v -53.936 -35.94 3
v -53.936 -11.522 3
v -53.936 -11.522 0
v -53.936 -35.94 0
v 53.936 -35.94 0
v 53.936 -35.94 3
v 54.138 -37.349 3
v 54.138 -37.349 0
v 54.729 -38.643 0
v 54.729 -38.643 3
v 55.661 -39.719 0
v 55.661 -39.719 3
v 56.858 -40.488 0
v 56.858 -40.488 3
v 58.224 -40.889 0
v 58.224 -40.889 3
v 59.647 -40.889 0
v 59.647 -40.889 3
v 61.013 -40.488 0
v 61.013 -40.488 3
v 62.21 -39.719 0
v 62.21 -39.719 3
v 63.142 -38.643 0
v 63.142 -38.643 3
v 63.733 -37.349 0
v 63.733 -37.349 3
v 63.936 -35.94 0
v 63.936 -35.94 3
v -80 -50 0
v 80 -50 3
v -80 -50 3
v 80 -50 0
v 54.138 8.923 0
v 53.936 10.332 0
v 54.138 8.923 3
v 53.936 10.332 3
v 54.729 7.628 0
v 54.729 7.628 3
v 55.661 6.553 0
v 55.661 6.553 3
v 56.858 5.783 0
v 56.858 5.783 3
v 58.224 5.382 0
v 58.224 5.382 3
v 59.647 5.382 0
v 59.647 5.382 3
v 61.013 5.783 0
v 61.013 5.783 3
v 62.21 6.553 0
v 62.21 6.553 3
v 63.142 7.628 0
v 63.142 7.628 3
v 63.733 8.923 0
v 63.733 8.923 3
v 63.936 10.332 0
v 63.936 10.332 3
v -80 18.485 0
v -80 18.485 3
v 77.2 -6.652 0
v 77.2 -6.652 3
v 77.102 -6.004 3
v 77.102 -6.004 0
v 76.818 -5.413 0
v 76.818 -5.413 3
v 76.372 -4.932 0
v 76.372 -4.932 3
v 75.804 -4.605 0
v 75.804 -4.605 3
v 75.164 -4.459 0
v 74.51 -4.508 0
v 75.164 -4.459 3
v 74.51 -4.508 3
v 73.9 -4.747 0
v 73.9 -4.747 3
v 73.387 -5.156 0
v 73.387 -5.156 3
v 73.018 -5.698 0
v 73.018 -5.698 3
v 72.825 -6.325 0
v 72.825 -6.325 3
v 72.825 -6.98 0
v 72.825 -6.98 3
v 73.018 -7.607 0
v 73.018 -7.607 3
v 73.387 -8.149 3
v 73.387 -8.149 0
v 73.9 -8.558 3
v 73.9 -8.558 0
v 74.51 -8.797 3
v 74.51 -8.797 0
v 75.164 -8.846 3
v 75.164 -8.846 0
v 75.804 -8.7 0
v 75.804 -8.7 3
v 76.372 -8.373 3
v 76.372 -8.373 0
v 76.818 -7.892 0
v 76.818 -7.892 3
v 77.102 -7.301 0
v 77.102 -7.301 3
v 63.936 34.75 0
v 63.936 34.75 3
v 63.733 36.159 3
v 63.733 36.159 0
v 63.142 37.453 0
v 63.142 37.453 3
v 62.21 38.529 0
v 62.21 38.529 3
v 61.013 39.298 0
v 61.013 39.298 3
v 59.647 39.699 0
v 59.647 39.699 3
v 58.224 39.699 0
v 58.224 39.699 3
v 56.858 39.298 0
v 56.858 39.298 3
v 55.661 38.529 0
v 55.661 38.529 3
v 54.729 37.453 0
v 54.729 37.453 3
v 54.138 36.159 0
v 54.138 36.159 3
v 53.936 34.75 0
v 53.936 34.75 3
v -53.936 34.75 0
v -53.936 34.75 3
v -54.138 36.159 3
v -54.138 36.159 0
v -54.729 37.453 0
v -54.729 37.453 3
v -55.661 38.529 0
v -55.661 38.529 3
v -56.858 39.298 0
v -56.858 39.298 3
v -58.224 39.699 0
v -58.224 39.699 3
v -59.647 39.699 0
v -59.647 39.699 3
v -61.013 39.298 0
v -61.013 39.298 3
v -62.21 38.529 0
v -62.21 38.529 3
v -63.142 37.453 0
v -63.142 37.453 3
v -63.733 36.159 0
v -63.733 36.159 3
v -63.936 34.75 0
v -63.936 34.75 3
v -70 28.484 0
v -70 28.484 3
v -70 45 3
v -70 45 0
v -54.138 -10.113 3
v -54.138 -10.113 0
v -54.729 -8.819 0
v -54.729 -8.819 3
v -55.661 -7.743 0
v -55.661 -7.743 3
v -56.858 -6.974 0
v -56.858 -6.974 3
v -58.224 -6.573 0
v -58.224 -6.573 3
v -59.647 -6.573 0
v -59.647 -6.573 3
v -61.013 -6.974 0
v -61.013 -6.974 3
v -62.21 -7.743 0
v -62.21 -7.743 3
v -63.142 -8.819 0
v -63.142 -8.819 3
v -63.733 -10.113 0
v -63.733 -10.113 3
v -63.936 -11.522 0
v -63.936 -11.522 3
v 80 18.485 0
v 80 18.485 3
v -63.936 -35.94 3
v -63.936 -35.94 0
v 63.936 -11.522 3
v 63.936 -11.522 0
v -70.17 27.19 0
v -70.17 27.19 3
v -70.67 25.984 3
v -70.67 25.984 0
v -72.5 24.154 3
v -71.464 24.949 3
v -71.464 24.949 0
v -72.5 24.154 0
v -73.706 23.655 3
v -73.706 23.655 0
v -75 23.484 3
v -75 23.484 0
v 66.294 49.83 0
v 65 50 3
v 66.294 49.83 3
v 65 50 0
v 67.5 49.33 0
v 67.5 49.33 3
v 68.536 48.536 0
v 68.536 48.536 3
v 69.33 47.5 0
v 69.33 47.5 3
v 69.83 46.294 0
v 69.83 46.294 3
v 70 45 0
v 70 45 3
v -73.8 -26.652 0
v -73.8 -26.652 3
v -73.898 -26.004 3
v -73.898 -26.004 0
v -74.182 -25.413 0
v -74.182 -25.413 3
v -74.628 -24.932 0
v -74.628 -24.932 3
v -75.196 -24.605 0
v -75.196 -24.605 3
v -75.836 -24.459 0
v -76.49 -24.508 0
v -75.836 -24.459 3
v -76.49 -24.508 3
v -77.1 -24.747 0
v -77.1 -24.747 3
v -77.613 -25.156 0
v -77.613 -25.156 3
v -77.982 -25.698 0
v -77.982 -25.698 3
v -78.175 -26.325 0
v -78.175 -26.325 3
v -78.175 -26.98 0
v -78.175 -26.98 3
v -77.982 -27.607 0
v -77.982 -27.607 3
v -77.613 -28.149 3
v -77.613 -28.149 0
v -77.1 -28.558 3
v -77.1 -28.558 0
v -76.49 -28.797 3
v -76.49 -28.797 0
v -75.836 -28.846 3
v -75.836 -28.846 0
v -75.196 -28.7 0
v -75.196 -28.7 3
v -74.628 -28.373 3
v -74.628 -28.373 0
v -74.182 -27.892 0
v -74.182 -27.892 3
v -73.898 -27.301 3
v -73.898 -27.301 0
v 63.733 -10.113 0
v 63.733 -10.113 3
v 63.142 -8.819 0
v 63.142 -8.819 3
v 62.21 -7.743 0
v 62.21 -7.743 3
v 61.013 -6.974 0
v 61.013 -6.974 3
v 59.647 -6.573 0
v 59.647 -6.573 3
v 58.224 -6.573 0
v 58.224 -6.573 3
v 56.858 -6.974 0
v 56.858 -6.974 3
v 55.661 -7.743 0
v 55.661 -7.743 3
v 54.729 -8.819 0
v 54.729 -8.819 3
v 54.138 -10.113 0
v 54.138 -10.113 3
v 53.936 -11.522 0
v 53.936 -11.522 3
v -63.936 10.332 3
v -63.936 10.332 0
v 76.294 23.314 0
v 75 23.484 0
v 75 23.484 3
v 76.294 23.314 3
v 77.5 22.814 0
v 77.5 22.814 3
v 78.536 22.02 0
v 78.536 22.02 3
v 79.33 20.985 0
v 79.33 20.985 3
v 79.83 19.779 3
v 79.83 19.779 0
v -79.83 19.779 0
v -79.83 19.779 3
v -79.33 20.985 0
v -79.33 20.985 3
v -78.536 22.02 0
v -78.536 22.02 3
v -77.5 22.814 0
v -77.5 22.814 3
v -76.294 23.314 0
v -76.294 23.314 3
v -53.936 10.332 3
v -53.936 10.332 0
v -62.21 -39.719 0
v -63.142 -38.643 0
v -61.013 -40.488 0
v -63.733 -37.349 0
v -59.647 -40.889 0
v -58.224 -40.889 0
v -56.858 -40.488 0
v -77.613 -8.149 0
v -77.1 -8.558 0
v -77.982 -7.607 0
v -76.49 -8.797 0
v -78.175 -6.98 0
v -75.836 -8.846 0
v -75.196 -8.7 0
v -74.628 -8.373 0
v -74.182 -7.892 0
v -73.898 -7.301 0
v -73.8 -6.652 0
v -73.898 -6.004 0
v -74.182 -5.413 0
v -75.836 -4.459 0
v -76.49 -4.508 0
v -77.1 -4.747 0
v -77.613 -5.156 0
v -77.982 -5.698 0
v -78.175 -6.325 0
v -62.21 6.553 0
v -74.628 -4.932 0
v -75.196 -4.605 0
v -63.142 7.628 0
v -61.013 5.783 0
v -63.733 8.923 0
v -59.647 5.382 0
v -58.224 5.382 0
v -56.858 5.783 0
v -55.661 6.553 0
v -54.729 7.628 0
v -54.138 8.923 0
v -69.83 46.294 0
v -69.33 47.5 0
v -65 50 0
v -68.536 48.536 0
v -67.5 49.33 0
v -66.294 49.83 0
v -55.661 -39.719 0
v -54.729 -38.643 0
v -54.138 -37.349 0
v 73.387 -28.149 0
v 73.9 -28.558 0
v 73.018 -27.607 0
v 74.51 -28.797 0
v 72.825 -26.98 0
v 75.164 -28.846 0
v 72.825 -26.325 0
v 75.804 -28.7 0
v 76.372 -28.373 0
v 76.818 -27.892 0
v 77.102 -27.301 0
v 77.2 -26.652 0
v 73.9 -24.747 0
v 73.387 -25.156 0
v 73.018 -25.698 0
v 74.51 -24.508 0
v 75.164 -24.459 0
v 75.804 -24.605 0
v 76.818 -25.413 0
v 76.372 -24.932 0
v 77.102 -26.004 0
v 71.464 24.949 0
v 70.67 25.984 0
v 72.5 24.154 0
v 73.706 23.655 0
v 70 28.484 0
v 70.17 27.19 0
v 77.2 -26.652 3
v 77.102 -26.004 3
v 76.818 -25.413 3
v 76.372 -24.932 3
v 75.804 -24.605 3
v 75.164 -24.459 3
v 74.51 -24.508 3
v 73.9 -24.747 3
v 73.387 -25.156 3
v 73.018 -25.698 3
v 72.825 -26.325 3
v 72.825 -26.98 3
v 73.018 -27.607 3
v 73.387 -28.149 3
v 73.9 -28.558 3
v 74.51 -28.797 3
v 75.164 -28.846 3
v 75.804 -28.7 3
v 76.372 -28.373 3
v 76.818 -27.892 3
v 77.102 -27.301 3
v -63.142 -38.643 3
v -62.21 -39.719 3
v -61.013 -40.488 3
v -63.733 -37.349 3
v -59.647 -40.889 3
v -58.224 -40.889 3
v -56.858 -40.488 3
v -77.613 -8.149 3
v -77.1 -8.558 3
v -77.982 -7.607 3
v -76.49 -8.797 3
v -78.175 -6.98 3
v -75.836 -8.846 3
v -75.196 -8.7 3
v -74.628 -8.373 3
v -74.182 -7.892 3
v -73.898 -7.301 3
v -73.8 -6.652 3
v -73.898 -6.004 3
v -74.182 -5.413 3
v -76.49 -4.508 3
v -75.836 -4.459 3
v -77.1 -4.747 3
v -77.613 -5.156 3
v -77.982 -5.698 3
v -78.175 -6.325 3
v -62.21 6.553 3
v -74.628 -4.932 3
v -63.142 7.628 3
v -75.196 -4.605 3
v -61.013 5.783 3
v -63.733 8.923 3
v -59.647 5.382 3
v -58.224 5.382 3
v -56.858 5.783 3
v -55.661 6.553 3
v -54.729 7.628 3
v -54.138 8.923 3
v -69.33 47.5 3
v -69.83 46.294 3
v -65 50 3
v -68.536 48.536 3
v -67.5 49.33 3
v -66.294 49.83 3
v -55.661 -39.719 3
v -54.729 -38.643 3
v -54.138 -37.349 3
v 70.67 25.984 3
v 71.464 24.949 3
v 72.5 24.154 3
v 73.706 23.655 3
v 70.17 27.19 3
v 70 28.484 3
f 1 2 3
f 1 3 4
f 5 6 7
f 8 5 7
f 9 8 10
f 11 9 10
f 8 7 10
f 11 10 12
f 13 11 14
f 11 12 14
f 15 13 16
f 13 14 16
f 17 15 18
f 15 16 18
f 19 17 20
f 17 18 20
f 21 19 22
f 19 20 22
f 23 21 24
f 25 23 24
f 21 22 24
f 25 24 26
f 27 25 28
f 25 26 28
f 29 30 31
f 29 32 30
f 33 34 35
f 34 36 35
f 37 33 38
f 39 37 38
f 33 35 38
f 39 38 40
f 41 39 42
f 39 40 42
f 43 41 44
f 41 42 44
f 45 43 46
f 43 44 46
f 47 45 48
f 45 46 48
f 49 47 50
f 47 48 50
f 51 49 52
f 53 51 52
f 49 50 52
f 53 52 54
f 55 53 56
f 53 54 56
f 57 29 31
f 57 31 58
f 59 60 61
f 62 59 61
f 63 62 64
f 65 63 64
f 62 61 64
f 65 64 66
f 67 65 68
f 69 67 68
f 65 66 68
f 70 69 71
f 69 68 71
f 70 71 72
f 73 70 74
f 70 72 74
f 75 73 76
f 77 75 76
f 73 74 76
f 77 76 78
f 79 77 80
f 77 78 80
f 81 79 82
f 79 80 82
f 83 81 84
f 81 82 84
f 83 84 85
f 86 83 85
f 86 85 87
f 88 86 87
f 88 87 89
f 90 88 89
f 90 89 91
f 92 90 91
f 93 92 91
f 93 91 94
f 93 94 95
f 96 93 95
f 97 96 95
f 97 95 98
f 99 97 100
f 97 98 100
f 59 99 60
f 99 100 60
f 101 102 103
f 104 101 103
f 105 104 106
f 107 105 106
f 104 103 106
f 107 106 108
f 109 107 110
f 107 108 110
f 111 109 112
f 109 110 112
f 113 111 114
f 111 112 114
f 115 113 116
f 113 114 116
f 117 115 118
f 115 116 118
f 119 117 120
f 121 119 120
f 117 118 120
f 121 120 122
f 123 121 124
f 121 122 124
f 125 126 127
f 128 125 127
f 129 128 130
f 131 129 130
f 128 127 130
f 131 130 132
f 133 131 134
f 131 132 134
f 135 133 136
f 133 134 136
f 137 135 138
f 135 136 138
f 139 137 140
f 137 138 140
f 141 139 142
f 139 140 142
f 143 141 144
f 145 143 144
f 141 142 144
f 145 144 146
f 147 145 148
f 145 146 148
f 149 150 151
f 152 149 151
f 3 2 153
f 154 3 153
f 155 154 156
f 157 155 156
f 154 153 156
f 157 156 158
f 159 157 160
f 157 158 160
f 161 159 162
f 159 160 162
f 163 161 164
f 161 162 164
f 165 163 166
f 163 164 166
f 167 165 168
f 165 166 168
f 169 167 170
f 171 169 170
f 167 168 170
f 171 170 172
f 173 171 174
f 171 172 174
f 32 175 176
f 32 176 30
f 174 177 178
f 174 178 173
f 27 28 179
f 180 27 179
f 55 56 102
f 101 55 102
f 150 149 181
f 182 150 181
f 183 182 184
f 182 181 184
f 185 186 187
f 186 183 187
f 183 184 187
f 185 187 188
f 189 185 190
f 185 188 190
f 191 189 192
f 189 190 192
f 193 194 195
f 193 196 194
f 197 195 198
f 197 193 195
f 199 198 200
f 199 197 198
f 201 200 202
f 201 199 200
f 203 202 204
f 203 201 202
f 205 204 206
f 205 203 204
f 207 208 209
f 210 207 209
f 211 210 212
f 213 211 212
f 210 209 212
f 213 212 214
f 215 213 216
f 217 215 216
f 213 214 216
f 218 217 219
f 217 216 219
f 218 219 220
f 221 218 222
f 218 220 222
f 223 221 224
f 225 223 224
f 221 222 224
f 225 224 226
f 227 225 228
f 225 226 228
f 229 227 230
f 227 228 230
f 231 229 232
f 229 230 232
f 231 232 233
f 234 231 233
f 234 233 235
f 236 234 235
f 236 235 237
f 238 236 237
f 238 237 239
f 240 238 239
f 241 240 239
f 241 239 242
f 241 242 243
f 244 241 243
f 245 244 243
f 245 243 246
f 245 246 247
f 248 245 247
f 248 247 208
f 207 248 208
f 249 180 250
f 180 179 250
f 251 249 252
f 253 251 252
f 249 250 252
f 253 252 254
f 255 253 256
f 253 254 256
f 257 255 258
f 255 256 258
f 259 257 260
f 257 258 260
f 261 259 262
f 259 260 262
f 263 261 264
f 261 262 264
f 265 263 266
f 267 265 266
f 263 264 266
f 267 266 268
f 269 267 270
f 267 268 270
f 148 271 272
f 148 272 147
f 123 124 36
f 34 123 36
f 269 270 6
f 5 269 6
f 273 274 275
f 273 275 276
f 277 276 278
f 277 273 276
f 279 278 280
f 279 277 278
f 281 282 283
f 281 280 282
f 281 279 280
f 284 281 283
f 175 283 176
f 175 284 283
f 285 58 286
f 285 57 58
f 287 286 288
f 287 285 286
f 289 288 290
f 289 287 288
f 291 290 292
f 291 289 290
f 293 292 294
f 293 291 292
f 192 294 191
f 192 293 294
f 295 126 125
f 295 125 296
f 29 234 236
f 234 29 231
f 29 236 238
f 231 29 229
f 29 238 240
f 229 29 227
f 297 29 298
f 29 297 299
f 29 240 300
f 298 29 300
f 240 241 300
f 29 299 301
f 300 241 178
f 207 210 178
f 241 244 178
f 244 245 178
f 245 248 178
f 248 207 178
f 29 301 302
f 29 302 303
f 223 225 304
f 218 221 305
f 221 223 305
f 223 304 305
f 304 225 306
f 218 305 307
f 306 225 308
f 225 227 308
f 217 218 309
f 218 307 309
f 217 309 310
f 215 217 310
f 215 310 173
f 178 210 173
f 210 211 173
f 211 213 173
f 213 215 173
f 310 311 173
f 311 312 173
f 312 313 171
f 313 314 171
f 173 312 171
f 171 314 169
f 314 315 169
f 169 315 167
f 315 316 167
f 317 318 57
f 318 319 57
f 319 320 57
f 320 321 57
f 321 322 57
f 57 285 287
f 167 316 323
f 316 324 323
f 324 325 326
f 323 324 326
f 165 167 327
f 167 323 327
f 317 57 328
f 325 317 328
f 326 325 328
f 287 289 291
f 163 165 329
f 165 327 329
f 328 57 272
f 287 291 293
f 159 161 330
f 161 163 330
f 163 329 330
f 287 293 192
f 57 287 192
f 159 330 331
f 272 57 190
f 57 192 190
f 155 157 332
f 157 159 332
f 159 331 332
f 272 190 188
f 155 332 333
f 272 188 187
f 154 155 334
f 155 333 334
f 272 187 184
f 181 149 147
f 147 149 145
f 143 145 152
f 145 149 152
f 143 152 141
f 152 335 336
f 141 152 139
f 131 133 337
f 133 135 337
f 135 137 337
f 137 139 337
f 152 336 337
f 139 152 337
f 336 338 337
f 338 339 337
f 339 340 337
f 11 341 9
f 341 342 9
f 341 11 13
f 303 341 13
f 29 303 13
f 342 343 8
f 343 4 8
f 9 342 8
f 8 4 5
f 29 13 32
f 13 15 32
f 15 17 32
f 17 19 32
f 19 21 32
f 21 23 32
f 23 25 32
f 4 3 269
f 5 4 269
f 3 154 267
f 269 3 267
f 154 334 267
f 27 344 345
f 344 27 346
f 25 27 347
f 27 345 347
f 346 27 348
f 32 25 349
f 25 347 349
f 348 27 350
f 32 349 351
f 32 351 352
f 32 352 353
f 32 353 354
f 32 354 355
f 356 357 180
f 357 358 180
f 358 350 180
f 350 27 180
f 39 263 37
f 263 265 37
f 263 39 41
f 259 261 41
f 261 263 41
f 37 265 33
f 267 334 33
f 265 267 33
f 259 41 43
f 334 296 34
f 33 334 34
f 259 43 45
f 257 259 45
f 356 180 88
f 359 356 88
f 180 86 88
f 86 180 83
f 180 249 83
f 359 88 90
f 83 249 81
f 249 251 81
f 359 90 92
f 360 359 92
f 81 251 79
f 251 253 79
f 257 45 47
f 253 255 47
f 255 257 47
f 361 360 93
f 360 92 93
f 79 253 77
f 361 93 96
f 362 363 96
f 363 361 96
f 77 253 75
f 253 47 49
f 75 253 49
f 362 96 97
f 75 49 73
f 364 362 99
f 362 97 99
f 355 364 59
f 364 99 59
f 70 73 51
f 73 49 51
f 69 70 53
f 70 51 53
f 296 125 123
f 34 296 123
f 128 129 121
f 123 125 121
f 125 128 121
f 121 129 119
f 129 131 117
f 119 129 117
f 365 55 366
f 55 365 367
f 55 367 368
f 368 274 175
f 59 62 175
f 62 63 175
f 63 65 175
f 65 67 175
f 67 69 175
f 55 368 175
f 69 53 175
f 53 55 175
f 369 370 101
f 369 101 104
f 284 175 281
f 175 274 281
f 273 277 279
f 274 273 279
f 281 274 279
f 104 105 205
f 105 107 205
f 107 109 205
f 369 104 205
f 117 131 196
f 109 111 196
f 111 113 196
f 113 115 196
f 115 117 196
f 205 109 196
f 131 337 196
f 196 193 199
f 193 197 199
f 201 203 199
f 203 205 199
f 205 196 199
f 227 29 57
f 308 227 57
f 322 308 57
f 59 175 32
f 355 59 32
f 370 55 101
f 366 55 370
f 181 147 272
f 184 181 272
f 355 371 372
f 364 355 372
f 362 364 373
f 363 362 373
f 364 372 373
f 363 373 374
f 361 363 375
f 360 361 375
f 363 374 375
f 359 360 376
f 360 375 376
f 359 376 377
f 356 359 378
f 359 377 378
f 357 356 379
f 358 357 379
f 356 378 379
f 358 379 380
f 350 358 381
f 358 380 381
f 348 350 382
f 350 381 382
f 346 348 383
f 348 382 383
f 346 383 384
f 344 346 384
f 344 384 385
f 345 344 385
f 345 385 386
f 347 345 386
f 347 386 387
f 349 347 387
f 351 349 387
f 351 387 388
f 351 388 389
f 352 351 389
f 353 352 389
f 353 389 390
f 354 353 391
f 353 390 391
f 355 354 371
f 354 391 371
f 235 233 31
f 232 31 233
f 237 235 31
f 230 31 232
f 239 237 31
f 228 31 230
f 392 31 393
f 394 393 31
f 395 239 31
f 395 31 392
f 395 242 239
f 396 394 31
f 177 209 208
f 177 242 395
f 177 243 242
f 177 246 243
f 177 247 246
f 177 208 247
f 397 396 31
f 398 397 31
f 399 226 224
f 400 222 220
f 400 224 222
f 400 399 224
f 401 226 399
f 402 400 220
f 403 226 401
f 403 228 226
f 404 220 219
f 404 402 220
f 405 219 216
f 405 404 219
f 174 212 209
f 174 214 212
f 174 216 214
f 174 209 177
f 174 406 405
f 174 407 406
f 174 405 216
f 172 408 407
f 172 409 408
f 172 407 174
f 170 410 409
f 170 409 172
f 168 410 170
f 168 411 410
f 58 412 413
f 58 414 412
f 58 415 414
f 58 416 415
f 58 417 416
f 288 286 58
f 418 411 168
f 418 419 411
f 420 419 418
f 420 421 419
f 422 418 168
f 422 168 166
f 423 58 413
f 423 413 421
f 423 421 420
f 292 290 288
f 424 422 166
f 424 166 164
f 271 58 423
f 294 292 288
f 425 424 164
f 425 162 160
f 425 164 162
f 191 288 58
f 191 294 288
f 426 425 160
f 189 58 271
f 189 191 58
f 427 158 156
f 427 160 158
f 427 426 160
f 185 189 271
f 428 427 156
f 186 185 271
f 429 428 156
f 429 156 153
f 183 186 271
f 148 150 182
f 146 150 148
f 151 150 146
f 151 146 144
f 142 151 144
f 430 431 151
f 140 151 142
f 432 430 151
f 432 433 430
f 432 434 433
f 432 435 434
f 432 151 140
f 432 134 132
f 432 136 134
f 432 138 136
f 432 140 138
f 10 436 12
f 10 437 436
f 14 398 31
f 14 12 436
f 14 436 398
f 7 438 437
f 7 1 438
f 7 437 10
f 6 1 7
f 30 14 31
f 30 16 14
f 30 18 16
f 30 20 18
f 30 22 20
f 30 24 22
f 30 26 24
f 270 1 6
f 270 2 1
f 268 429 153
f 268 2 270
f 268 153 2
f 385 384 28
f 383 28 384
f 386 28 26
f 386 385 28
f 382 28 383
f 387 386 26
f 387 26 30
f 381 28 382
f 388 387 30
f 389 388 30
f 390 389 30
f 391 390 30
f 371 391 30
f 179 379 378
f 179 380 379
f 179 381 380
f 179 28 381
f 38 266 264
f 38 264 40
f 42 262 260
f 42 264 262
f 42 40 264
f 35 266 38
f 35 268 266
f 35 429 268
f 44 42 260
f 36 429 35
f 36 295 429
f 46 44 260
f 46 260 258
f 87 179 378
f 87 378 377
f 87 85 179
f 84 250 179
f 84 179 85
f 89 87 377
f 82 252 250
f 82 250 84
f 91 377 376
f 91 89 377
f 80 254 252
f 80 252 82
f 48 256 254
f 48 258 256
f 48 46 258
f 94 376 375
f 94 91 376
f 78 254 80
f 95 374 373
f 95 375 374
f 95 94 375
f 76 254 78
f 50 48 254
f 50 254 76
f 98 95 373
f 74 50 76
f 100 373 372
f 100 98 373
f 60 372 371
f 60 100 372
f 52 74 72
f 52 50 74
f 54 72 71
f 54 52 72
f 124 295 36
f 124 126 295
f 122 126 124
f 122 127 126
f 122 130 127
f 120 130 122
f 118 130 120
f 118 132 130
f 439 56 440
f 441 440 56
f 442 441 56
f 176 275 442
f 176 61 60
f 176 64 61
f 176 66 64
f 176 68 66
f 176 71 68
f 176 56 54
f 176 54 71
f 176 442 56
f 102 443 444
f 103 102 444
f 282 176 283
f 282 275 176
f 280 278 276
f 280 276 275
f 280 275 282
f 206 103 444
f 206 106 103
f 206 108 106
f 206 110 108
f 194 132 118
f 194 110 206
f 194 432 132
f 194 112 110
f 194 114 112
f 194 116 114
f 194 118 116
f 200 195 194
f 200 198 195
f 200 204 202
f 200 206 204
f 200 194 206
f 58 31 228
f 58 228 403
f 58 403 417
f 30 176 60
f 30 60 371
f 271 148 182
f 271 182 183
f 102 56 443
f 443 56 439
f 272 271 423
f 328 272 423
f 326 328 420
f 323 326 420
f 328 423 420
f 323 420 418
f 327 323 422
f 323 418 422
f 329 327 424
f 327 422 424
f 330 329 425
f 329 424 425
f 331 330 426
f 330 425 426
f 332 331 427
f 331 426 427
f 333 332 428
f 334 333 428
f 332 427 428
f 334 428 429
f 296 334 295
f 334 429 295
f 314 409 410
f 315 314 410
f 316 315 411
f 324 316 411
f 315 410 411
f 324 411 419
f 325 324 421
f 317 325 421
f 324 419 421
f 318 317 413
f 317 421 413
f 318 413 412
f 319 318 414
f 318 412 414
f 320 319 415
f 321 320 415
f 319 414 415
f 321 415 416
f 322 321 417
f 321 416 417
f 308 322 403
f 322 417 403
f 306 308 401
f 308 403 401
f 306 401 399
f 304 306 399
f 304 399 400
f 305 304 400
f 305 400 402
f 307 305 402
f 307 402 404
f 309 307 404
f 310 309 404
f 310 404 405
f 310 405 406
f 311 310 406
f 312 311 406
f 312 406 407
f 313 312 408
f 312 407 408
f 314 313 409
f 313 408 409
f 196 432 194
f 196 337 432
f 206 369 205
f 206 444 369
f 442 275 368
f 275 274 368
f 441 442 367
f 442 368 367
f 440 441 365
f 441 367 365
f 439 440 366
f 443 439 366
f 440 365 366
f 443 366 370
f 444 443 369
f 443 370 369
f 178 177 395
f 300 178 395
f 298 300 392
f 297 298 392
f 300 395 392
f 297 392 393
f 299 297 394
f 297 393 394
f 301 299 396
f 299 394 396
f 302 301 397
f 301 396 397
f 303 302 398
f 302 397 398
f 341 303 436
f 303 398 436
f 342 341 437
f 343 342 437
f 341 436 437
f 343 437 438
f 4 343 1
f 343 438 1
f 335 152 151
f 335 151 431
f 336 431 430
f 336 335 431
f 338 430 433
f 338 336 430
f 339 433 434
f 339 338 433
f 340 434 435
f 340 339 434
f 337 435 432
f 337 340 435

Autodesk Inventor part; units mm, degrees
ref_plane "YZ Plane" through (0, 0, 0) normal (1, 0, 0) x (0, 1, 0)
ref_plane "XZ Plane" through (0, 0, 0) normal (0, 1, 0) x (-1, 0, 0)
ref_plane "XY Plane" through (0, 0, 0) normal (0, 0, 1) x (1, 0, 0)
sketch "草图1" plane through (0, 0, 0) normal (0, 0, 1) x (1, 0, 0)
  line L0 (80, -50) -> (-80, -50)
  line L1 (-80, -50) -> (-80, 50)
  line L2 (-80, 50) -> (80, 50)
  line L3 (80, 50) -> (80, -50)
  line L4 (80, -50) -> (-80, 50) construction
  line L5 (-80, -50) -> (80, 50) construction
  point P0 (0, 0)
  dimension "d0" = 100
  dimension "d1" = 160
extrude "拉伸1" add sketch "草图1" along normal blind 3
sketch "草图2" plane through (0, 0, 3) normal (0, 0, 1) x (1, 0, 0)
  line L0 (-70, 23.4843) -> (-70, 54.6776)
  line L1 (70, 15.0319) -> (70, 54.3435) projected
  line L2 (-80, 50) -> (-80, -50) projected
  line L3 (-80, 23.4843) -> (80.034, 23.4843)
  line L4 (80, 50) -> (-80, 50) projected
  line L5 (-80, 50) -> (-80, -50) projected
  line L6 (-80, -50) -> (80, -50) projected
  line L7 (80, -50) -> (80, 50) projected
  point P0 (0, 0)
  point P1 (80, 23.4843)
  point P2 (70, 50)
  point P3 (70, 23.4843)
  point P4 (-70, 50)
  dimension "d6" = 10
  dimension "d7" = 10
extrude "拉伸2" cut sketch "草图2" against normal blind 10 contours L3 L2 L4 L0 | L1 L4 L7 L3
fillet "圆角1" radius 5 6 edges at (-80, 23.4843, 1.5) (-70, 23.4843, 1.5) (-70, 50, 1.5) (70, 50, 1.5) (70, 23.4843, 1.5) (80, 23.4843, 1.5)
sketch "草图7" plane through (0, 0, 3) normal (0, 0, 1) x (1, 0, 0)
  circle A0 centre (75, -6.6525) radius 1.2 projected
  circle A1 centre (75, -26.6525) radius 1.2 projected
  circle A2 centre (-76, -6.6525) radius 1.2 projected
  circle A3 centre (-76, -26.6525) radius 1.2 projected
  circle A4 centre (-76, -6.6525) radius 2.2
  circle A5 centre (-76, -26.6525) radius 2.2
  circle A6 centre (75, -6.6525) radius 2.2
  circle A7 centre (75, -26.6525) radius 2.2
  point P0 (0, 0)
  dimension "d78" = 1
  dimension "d79" = 1
  dimension "d80" = 1
  dimension "d81" = 1
extrude "拉伸5" cut sketch "草图7" against normal blind 10 contours A0 | A1 | A2 | A3 | A4 | A5 | A6 | A7
sketch "草图6" plane through (0, 0, 3) normal (0, 0, 1) x (1, 0, 0)
  circle A0 centre (-0.337, 1.4402) radius 29.6824
  line L0 (58.9355, -11.5218) -> (58.9355, -35.9401) construction
  line L1 (53.9355, -11.5218) -> (53.9355, -35.9401)
  line L2 (63.9355, -35.9401) -> (63.9355, -11.5218)
  arc A1 (63.9355, -11.5218) -> (53.9355, -11.5218) centre (58.9355, -11.5218) ccw
  arc A2 (53.9355, -35.9401) -> (63.9355, -35.9401) centre (58.9355, -35.9401) ccw
  line L3 (58.9355, 34.7499) -> (58.9355, 10.3316) construction
  line L4 (53.9355, 34.7499) -> (53.9355, 10.3316)
  line L5 (63.9355, 10.3316) -> (63.9355, 34.7499)
  arc A3 (63.9355, 34.7499) -> (53.9355, 34.7499) centre (58.9355, 34.7499) ccw
  arc A4 (53.9355, 10.3316) -> (63.9355, 10.3316) centre (58.9355, 10.3316) ccw
  line L6 (65, 50) -> (-65, 50) projected
  line L7 (0, 50) -> (0, -49.5861)
  line L8 (-58.9355, -11.5218) -> (-58.9355, -35.9401) construction
  line L9 (-53.9355, -11.5218) -> (-53.9355, -35.9401)
  line L10 (-63.9355, -35.9401) -> (-63.9355, -11.5218)
  arc A5 (-53.9355, -11.5218) -> (-63.9355, -11.5218) centre (-58.9355, -11.5218) ccw
  arc A6 (-63.9355, -35.9401) -> (-53.9355, -35.9401) centre (-58.9355, -35.9401) ccw
  line L11 (-58.9355, 34.7499) -> (-58.9355, 10.3316) construction
  line L12 (-53.9355, 34.7499) -> (-53.9355, 10.3316)
  line L13 (-63.9355, 10.3316) -> (-63.9355, 34.7499)
  arc A7 (-53.9355, 34.7499) -> (-63.9355, 34.7499) centre (-58.9355, 34.7499) ccw
  arc A8 (-63.9355, 10.3316) -> (-53.9355, 10.3316) centre (-58.9355, 10.3316) ccw
  point P0 (0, 0)
  point P1 (58.9355, -23.7309)
  point P2 (58.9355, 22.5408)
  point P3 (-58.9355, -23.7309)
  point P4 (-58.9355, 22.5408)
  dimension "d70" = 5
  dimension "d71" = 5
extrude "拉伸4" cut sketch "草图6" against normal blind 10 contours A1 L2 A2 L1 | A3 L5 A4 L4 | L9 A6 L10 A5 | L12 A8 L13 A7
sketch "草图5" plane through (0, 0, 3) normal (0, 0, 1) x (1, 0, 0)
  line L0 (-51.948, 44.2905) -> (50.6435, 44.2905) construction
  line L1 (50.6435, 44.2905) -> (50.6435, -58.301) construction
  line L2 (50.6435, -58.301) -> (-51.948, -58.301) construction
  line L3 (-51.948, -58.301) -> (-51.948, 44.2905) construction
  circle A0 centre (-0.337, 1.4402) radius 19.5793
  circle A1 centre (-0.337, 1.4402) radius 22.0126
  circle A2 centre (-0.1836, 17.5889) radius 1.0689
  circle A3 centre (14.0973, -7.3293) radius 1.2102
  circle A4 centre (-14.6768, -7.0871) radius 1.2453
  arc A5 (-1.5966, 22.3303) -> (-3.177, 23.2671) centre (-2.9305, 21.8816) ccw
  arc A6 (-1.5966, 22.3303) -> (1.2246, 22.333) centre (-0.1861, 22.4331) ccw
  arc A7 (2.2174, 23.304) -> (1.2246, 22.333) centre (2.87, 21.6437) ccw
  line L4 (-3.1076, 23.2777) -> (-2.7908, 20.865)
  line L5 (2.4336, 23.2777) -> (2.4336, 20.8224)
  arc A8 (-6.9604, 21.2925) -> (-8.7295, 21.7883) centre (-8.1327, 20.5138) ccw
  arc A9 (-6.9604, 21.2925) -> (-4.236, 22.0252) centre (-5.6246, 21.7569) ccw
  arc A10 (-3.5284, 23.2201) -> (-4.236, 22.0252) centre (-2.4683, 21.7854) ccw
  arc A11 (-11.8729, 18.9017) -> (-13.71, 18.9228) centre (-12.8037, 17.8462) ccw
  arc A12 (-11.8729, 18.9017) -> (-9.431, 20.3147) centre (-10.7028, 19.6961) ccw
  arc A13 (-9.0567, 21.652) -> (-9.431, 20.3147) centre (-7.6614, 20.5405) ccw
  arc A14 (-15.9992, 15.321) -> (-17.7792, 14.8659) centre (-16.6251, 14.0606) ccw
  arc A15 (-15.9992, 15.321) -> (-14.0062, 17.3179) centre (-15.0746, 16.3912) ccw
  arc A16 (-13.9908, 18.7065) -> (-14.0062, 17.3179) centre (-12.3554, 17.994) ccw
  arc A17 (-19.0582, 10.7944) -> (-20.6597, 9.8941) centre (-19.3365, 9.4149) ccw
  arc A18 (-19.0582, 10.7944) -> (-17.6499, 13.239) centre (-18.442, 12.0674) ccw
  arc A19 (-17.9944, 14.5843) -> (-17.6499, 13.239) centre (-16.2303, 14.3193) ccw
  arc A20 (-20.8413, 5.6302) -> (-22.1553, 4.3462) centre (-20.7531, 4.2257) ccw
  arc A21 (-20.8413, 5.6302) -> (-20.1137, 8.356) centre (-20.5756, 7.0193) ccw
  arc A22 (-20.7947, 9.5663) -> (-20.1137, 8.356) centre (-19.0221, 9.767) ccw
  arc A23 (-21.2271, 0.1806) -> (-22.164, -1.3998) centre (-20.7784, -1.1533) ccw
  arc A24 (-21.2271, 0.1806) -> (-21.2298, 3.0018) centre (-21.33, 1.5911) ccw
  arc A25 (-22.2009, 3.9946) -> (-21.2298, 3.0018) centre (-20.5406, 4.6472) ccw
  arc A26 (-20.1893, -5.1833) -> (-20.6852, -6.9523) centre (-19.4107, -6.3555) ccw
  arc A27 (-20.1893, -5.1833) -> (-20.9221, -2.4589) centre (-20.6537, -3.8474) ccw
  arc A28 (-22.117, -1.7512) -> (-20.9221, -2.4589) centre (-20.6822, -0.6911) ccw
  arc A29 (-17.7986, -10.0958) -> (-17.8197, -11.9328) centre (-16.7431, -11.0265) ccw
  arc A30 (-17.7986, -10.0958) -> (-19.2115, -7.6538) centre (-18.5929, -8.9256) ccw
  arc A31 (-20.5489, -7.2796) -> (-19.2115, -7.6538) centre (-19.4374, -5.8843) ccw
  arc A32 (-14.2179, -14.2221) -> (-13.7628, -16.002) centre (-12.9574, -14.8479) ccw
  arc A33 (-14.2179, -14.2221) -> (-16.2147, -12.229) centre (-15.288, -13.2974) ccw
  arc A34 (-17.6033, -12.2137) -> (-16.2147, -12.229) centre (-16.8908, -10.5782) ccw
  arc A35 (-9.6912, -17.281) -> (-8.791, -18.8825) centre (-8.3117, -17.5594) ccw
  arc A36 (-9.6912, -17.281) -> (-12.1358, -15.8727) centre (-10.9642, -16.6648) ccw
  arc A37 (-13.4811, -16.2173) -> (-12.1358, -15.8727) centre (-13.2162, -14.4531) ccw
  arc A38 (-4.5271, -19.0642) -> (-3.243, -20.3781) centre (-3.1226, -18.976) ccw
  arc A39 (-4.5271, -19.0642) -> (-7.2529, -18.3366) centre (-5.9162, -18.7985) ccw
  arc A40 (-8.4632, -19.0176) -> (-7.2529, -18.3366) centre (-8.6639, -17.245) ccw
  arc A41 (0.9226, -19.45) -> (2.503, -20.3868) centre (2.2564, -19.0013) ccw
  arc A42 (0.9226, -19.45) -> (-1.8987, -19.4527) centre (-0.4879, -19.5528) ccw
  arc A43 (-2.8914, -20.4237) -> (-1.8987, -19.4527) centre (-3.5441, -18.7634) ccw
  arc A44 (6.2864, -18.4122) -> (8.0554, -18.908) centre (7.4587, -17.6335) ccw
  arc A45 (6.2864, -18.4122) -> (3.562, -19.1449) centre (4.9506, -18.8766) ccw
  arc A46 (2.8544, -20.3398) -> (3.562, -19.1449) centre (1.7943, -18.9051) ccw
  arc A47 (11.1989, -16.0214) -> (13.036, -16.0425) centre (12.1297, -14.9659) ccw
  arc A48 (11.1989, -16.0214) -> (8.757, -17.4344) centre (10.0288, -16.8158) ccw
  arc A49 (8.3827, -18.7717) -> (8.757, -17.4344) centre (6.9874, -17.6602) ccw
  arc A50 (15.3252, -12.4407) -> (17.1051, -11.9856) centre (15.9511, -11.1803) ccw
  arc A51 (15.3252, -12.4407) -> (13.3322, -14.4376) centre (14.4005, -13.5109) ccw
  arc A52 (13.3168, -15.8262) -> (13.3322, -14.4376) centre (11.6814, -15.1137) ccw
  arc A53 (18.3842, -7.9141) -> (19.9857, -7.0138) centre (18.6625, -6.5346) ccw
  arc A54 (18.3842, -7.9141) -> (16.9759, -10.3587) centre (17.768, -9.1871) ccw
  arc A55 (17.3204, -11.704) -> (16.9759, -10.3587) centre (15.5563, -11.439) ccw
  arc A56 (20.1673, -2.7499) -> (21.4812, -1.4659) centre (20.0791, -1.3454) ccw
  arc A57 (20.1673, -2.7499) -> (19.4397, -5.4757) centre (19.9016, -4.139) ccw
  arc A58 (20.1207, -6.686) -> (19.4397, -5.4757) centre (18.3481, -6.8867) ccw
  arc A59 (20.5531, 2.6997) -> (21.4899, 4.2801) centre (20.1044, 4.0336) ccw
  arc A60 (20.5531, 2.6997) -> (20.5558, -0.1215) centre (20.656, 1.2892) ccw
  arc A61 (21.5268, -1.1143) -> (20.5558, -0.1215) centre (19.8666, -1.7669) ccw
  arc A62 (19.5153, 8.0636) -> (20.0111, 9.8326) centre (18.7366, 9.2358) ccw
  arc A63 (19.5153, 8.0636) -> (20.2481, 5.3392) centre (19.9797, 6.7277) ccw
  arc A64 (21.443, 4.6315) -> (20.2481, 5.3392) centre (20.0082, 3.5714) ccw
  arc A65 (17.1246, 12.9761) -> (17.1457, 14.8131) centre (16.0691, 13.9068) ccw
  arc A66 (17.1246, 12.9761) -> (18.5375, 10.5341) centre (17.9189, 11.8059) ccw
  arc A67 (19.8749, 10.1599) -> (18.5375, 10.5341) centre (18.7633, 8.7646) ccw
  arc A68 (13.5439, 17.1024) -> (13.0888, 18.8823) centre (12.2834, 17.7283) ccw
  arc A69 (13.5439, 17.1024) -> (15.5407, 15.1093) centre (14.614, 16.1777) ccw
  arc A70 (16.9293, 15.094) -> (15.5407, 15.1093) centre (16.2168, 13.4585) ccw
  arc A71 (9.0172, 20.1613) -> (8.1169, 21.7628) centre (7.6377, 20.4397) ccw
  arc A72 (9.0172, 20.1613) -> (11.4618, 18.753) centre (10.2902, 19.5451) ccw
  arc A73 (12.8071, 19.0976) -> (11.4618, 18.753) centre (12.5422, 17.3335) ccw
  arc A74 (3.8531, 21.9445) -> (2.569, 23.2584) centre (2.4485, 21.8563) ccw
  arc A75 (3.8531, 21.9445) -> (6.5789, 21.2169) centre (5.2422, 21.6788) ccw
  arc A76 (7.7892, 21.8979) -> (6.5789, 21.2169) centre (7.9898, 20.1253) ccw
  circle A77 centre (-0.337, 1.4402) radius 17.3264
  arc A78 (-1.8119, 16.3912) -> (1.4108, 16.5709) centre (-0.2439, 17.2588) ccw
  line L6 (-1.8119, 16.3912) -> (-3.3302, 18.506)
  line L7 (1.4108, 16.5709) -> (2.5167, 18.5299)
  line L8 (-16.4097, -5.0307) -> (-13.9908, -5.0307)
  line L9 (-13.4922, -9.8356) -> (-12.6482, -7.9141)
  arc A79 (-12.6482, -7.9141) -> (-13.9908, -5.0307) centre (-14.3731, -6.963) ccw
  line L10 (12.9811, -9.6427) -> (11.9394, -7.9141)
  arc A80 (13.1454, -5.3295) -> (11.9394, -7.9141) centre (13.7218, -7.1721) ccw
  line L11 (13.1454, -5.3295) -> (15.7357, -5.0307)
  line L12 (-9.9945, 15.2423) -> (9.7915, 15.2423)
  line L13 (9.7915, 15.2423) -> (9.7915, 12.3918)
  line L14 (9.7915, 12.3918) -> (4.8774, 12.3918)
  line L15 (4.8774, 12.3918) -> (4.8774, 11.3614)
  line L16 (4.8774, 11.3614) -> (-0.1015, 3.7166)
  line L17 (-0.1015, 3.7166) -> (4.8774, 5.6302)
  line L18 (4.8774, 5.6302) -> (4.8774, -10.799)
  line L19 (4.8774, -10.799) -> (9.9178, -10.799)
  line L20 (-10.2582, -10.5782) -> (-10.3245, -13.73)
  line L21 (-10.3245, -13.73) -> (8.2621, -13.73)
  line L22 (-10.2582, -10.5782) -> (-4.859, -10.5782)
  line L23 (-4.859, -10.5782) -> (-4.859, -9.8356)
  line L24 (-4.859, -9.8356) -> (0.725, -0.9592)
  line L25 (0.725, -0.9592) -> (-4.859, -4.139)
  line L26 (-4.859, -4.139) -> (-4.9409, 11.6269)
  line L27 (-4.9409, 11.6269) -> (-9.9945, 11.6007)
  line L28 (-9.9945, 11.6007) -> (-9.9945, 15.2423)
  line L29 (-6.5155, -6.1315) -> (-3.3302, -4.6028)
  line L30 (-3.3302, -4.6028) -> (-6.4171, -9.3424)
  line L31 (-6.4171, -9.3424) -> (-6.5155, -6.1315)
  line L32 (2.7649, 6.2064) -> (5.9307, 7.7259)
  line L33 (5.9307, 7.7259) -> (5.9307, 10.7944)
  line L34 (5.9307, 10.7944) -> (2.7649, 6.2064)
  line L35 (9.9178, -10.799) -> (9.9178, -13.73)
  point P0 (-8.6651, 21.8165)
  point P1 (-13.6551, 18.9667)
  point P2 (-17.7376, 14.9225)
  point P3 (-20.6341, 9.9595)
  point P4 (-22.1475, 4.416)
  point P5 (-22.1745, -1.3304)
  point P6 (-20.7134, -6.888)
  point P7 (-17.8636, -11.878)
  point P8 (-13.8194, -15.9604)
  point P9 (-8.8564, -18.857)
  point P10 (-3.3128, -20.3703)
  point P11 (2.4336, -20.3974)
  point P12 (7.9911, -18.9362)
  point P13 (12.9811, -16.0864)
  point P14 (17.0635, -12.0422)
  point P15 (19.9601, -7.0792)
  point P16 (21.4735, -1.5357)
  point P17 (21.5005, 4.2107)
  point P18 (20.0393, 9.7683)
  point P19 (17.1895, 14.7583)
  point P20 (13.1454, 18.8407)
  point P21 (8.1824, 21.7373)
  point P22 (2.6388, 23.2506)
  point P23 (-3.5284, 23.2201)
  point P24 (-8.6651, 21.8165)
  point P25 (-13.6551, 18.9667)
  point P26 (-13.9908, 18.7065)
  point P27 (-17.7376, 14.9225)
  point P28 (-17.9944, 14.5843)
  point P29 (-20.6341, 9.9595)
  point P30 (-22.1475, 4.416)
  point P31 (-22.1745, -1.3304)
  point P32 (-22.117, -1.7512)
  point P33 (-20.7134, -6.888)
  point P34 (-17.8636, -11.878)
  point P35 (-17.6033, -12.2137)
  point P36 (-13.8194, -15.9604)
  point P37 (-8.8564, -18.857)
  point P38 (-3.3128, -20.3703)
  point P39 (-2.8914, -20.4237)
  point P40 (2.4336, -20.3974)
  point P41 (2.8544, -20.3398)
  point P42 (7.9911, -18.9362)
  point P43 (8.3827, -18.7717)
  point P44 (12.9811, -16.0864)
  point P45 (17.0635, -12.0422)
  point P46 (19.9601, -7.0792)
  point P47 (20.1207, -6.686)
  point P48 (21.4735, -1.5357)
  point P49 (21.5005, 4.2107)
  point P50 (21.443, 4.6315)
  point P51 (20.0393, 9.7683)
  point P52 (19.8749, 10.1599)
  point P53 (17.1895, 14.7583)
  point P54 (16.9293, 15.094)
  point P55 (13.1454, 18.8407)
  point P56 (8.1824, 21.7373)
  point P57 (7.7892, 21.8979)
  point P58 (2.6388, 23.2506)
  point P59 (-10.3035, -12.7328)
  point P60 (-8.7078, -13.73)
  point P61 (8.0337, -13.73)
  point P62 (9.9178, -12.5256)
  dimension "d45" = 39.1585
  dimension "d51" = 360
properties part number "前挡板2"
